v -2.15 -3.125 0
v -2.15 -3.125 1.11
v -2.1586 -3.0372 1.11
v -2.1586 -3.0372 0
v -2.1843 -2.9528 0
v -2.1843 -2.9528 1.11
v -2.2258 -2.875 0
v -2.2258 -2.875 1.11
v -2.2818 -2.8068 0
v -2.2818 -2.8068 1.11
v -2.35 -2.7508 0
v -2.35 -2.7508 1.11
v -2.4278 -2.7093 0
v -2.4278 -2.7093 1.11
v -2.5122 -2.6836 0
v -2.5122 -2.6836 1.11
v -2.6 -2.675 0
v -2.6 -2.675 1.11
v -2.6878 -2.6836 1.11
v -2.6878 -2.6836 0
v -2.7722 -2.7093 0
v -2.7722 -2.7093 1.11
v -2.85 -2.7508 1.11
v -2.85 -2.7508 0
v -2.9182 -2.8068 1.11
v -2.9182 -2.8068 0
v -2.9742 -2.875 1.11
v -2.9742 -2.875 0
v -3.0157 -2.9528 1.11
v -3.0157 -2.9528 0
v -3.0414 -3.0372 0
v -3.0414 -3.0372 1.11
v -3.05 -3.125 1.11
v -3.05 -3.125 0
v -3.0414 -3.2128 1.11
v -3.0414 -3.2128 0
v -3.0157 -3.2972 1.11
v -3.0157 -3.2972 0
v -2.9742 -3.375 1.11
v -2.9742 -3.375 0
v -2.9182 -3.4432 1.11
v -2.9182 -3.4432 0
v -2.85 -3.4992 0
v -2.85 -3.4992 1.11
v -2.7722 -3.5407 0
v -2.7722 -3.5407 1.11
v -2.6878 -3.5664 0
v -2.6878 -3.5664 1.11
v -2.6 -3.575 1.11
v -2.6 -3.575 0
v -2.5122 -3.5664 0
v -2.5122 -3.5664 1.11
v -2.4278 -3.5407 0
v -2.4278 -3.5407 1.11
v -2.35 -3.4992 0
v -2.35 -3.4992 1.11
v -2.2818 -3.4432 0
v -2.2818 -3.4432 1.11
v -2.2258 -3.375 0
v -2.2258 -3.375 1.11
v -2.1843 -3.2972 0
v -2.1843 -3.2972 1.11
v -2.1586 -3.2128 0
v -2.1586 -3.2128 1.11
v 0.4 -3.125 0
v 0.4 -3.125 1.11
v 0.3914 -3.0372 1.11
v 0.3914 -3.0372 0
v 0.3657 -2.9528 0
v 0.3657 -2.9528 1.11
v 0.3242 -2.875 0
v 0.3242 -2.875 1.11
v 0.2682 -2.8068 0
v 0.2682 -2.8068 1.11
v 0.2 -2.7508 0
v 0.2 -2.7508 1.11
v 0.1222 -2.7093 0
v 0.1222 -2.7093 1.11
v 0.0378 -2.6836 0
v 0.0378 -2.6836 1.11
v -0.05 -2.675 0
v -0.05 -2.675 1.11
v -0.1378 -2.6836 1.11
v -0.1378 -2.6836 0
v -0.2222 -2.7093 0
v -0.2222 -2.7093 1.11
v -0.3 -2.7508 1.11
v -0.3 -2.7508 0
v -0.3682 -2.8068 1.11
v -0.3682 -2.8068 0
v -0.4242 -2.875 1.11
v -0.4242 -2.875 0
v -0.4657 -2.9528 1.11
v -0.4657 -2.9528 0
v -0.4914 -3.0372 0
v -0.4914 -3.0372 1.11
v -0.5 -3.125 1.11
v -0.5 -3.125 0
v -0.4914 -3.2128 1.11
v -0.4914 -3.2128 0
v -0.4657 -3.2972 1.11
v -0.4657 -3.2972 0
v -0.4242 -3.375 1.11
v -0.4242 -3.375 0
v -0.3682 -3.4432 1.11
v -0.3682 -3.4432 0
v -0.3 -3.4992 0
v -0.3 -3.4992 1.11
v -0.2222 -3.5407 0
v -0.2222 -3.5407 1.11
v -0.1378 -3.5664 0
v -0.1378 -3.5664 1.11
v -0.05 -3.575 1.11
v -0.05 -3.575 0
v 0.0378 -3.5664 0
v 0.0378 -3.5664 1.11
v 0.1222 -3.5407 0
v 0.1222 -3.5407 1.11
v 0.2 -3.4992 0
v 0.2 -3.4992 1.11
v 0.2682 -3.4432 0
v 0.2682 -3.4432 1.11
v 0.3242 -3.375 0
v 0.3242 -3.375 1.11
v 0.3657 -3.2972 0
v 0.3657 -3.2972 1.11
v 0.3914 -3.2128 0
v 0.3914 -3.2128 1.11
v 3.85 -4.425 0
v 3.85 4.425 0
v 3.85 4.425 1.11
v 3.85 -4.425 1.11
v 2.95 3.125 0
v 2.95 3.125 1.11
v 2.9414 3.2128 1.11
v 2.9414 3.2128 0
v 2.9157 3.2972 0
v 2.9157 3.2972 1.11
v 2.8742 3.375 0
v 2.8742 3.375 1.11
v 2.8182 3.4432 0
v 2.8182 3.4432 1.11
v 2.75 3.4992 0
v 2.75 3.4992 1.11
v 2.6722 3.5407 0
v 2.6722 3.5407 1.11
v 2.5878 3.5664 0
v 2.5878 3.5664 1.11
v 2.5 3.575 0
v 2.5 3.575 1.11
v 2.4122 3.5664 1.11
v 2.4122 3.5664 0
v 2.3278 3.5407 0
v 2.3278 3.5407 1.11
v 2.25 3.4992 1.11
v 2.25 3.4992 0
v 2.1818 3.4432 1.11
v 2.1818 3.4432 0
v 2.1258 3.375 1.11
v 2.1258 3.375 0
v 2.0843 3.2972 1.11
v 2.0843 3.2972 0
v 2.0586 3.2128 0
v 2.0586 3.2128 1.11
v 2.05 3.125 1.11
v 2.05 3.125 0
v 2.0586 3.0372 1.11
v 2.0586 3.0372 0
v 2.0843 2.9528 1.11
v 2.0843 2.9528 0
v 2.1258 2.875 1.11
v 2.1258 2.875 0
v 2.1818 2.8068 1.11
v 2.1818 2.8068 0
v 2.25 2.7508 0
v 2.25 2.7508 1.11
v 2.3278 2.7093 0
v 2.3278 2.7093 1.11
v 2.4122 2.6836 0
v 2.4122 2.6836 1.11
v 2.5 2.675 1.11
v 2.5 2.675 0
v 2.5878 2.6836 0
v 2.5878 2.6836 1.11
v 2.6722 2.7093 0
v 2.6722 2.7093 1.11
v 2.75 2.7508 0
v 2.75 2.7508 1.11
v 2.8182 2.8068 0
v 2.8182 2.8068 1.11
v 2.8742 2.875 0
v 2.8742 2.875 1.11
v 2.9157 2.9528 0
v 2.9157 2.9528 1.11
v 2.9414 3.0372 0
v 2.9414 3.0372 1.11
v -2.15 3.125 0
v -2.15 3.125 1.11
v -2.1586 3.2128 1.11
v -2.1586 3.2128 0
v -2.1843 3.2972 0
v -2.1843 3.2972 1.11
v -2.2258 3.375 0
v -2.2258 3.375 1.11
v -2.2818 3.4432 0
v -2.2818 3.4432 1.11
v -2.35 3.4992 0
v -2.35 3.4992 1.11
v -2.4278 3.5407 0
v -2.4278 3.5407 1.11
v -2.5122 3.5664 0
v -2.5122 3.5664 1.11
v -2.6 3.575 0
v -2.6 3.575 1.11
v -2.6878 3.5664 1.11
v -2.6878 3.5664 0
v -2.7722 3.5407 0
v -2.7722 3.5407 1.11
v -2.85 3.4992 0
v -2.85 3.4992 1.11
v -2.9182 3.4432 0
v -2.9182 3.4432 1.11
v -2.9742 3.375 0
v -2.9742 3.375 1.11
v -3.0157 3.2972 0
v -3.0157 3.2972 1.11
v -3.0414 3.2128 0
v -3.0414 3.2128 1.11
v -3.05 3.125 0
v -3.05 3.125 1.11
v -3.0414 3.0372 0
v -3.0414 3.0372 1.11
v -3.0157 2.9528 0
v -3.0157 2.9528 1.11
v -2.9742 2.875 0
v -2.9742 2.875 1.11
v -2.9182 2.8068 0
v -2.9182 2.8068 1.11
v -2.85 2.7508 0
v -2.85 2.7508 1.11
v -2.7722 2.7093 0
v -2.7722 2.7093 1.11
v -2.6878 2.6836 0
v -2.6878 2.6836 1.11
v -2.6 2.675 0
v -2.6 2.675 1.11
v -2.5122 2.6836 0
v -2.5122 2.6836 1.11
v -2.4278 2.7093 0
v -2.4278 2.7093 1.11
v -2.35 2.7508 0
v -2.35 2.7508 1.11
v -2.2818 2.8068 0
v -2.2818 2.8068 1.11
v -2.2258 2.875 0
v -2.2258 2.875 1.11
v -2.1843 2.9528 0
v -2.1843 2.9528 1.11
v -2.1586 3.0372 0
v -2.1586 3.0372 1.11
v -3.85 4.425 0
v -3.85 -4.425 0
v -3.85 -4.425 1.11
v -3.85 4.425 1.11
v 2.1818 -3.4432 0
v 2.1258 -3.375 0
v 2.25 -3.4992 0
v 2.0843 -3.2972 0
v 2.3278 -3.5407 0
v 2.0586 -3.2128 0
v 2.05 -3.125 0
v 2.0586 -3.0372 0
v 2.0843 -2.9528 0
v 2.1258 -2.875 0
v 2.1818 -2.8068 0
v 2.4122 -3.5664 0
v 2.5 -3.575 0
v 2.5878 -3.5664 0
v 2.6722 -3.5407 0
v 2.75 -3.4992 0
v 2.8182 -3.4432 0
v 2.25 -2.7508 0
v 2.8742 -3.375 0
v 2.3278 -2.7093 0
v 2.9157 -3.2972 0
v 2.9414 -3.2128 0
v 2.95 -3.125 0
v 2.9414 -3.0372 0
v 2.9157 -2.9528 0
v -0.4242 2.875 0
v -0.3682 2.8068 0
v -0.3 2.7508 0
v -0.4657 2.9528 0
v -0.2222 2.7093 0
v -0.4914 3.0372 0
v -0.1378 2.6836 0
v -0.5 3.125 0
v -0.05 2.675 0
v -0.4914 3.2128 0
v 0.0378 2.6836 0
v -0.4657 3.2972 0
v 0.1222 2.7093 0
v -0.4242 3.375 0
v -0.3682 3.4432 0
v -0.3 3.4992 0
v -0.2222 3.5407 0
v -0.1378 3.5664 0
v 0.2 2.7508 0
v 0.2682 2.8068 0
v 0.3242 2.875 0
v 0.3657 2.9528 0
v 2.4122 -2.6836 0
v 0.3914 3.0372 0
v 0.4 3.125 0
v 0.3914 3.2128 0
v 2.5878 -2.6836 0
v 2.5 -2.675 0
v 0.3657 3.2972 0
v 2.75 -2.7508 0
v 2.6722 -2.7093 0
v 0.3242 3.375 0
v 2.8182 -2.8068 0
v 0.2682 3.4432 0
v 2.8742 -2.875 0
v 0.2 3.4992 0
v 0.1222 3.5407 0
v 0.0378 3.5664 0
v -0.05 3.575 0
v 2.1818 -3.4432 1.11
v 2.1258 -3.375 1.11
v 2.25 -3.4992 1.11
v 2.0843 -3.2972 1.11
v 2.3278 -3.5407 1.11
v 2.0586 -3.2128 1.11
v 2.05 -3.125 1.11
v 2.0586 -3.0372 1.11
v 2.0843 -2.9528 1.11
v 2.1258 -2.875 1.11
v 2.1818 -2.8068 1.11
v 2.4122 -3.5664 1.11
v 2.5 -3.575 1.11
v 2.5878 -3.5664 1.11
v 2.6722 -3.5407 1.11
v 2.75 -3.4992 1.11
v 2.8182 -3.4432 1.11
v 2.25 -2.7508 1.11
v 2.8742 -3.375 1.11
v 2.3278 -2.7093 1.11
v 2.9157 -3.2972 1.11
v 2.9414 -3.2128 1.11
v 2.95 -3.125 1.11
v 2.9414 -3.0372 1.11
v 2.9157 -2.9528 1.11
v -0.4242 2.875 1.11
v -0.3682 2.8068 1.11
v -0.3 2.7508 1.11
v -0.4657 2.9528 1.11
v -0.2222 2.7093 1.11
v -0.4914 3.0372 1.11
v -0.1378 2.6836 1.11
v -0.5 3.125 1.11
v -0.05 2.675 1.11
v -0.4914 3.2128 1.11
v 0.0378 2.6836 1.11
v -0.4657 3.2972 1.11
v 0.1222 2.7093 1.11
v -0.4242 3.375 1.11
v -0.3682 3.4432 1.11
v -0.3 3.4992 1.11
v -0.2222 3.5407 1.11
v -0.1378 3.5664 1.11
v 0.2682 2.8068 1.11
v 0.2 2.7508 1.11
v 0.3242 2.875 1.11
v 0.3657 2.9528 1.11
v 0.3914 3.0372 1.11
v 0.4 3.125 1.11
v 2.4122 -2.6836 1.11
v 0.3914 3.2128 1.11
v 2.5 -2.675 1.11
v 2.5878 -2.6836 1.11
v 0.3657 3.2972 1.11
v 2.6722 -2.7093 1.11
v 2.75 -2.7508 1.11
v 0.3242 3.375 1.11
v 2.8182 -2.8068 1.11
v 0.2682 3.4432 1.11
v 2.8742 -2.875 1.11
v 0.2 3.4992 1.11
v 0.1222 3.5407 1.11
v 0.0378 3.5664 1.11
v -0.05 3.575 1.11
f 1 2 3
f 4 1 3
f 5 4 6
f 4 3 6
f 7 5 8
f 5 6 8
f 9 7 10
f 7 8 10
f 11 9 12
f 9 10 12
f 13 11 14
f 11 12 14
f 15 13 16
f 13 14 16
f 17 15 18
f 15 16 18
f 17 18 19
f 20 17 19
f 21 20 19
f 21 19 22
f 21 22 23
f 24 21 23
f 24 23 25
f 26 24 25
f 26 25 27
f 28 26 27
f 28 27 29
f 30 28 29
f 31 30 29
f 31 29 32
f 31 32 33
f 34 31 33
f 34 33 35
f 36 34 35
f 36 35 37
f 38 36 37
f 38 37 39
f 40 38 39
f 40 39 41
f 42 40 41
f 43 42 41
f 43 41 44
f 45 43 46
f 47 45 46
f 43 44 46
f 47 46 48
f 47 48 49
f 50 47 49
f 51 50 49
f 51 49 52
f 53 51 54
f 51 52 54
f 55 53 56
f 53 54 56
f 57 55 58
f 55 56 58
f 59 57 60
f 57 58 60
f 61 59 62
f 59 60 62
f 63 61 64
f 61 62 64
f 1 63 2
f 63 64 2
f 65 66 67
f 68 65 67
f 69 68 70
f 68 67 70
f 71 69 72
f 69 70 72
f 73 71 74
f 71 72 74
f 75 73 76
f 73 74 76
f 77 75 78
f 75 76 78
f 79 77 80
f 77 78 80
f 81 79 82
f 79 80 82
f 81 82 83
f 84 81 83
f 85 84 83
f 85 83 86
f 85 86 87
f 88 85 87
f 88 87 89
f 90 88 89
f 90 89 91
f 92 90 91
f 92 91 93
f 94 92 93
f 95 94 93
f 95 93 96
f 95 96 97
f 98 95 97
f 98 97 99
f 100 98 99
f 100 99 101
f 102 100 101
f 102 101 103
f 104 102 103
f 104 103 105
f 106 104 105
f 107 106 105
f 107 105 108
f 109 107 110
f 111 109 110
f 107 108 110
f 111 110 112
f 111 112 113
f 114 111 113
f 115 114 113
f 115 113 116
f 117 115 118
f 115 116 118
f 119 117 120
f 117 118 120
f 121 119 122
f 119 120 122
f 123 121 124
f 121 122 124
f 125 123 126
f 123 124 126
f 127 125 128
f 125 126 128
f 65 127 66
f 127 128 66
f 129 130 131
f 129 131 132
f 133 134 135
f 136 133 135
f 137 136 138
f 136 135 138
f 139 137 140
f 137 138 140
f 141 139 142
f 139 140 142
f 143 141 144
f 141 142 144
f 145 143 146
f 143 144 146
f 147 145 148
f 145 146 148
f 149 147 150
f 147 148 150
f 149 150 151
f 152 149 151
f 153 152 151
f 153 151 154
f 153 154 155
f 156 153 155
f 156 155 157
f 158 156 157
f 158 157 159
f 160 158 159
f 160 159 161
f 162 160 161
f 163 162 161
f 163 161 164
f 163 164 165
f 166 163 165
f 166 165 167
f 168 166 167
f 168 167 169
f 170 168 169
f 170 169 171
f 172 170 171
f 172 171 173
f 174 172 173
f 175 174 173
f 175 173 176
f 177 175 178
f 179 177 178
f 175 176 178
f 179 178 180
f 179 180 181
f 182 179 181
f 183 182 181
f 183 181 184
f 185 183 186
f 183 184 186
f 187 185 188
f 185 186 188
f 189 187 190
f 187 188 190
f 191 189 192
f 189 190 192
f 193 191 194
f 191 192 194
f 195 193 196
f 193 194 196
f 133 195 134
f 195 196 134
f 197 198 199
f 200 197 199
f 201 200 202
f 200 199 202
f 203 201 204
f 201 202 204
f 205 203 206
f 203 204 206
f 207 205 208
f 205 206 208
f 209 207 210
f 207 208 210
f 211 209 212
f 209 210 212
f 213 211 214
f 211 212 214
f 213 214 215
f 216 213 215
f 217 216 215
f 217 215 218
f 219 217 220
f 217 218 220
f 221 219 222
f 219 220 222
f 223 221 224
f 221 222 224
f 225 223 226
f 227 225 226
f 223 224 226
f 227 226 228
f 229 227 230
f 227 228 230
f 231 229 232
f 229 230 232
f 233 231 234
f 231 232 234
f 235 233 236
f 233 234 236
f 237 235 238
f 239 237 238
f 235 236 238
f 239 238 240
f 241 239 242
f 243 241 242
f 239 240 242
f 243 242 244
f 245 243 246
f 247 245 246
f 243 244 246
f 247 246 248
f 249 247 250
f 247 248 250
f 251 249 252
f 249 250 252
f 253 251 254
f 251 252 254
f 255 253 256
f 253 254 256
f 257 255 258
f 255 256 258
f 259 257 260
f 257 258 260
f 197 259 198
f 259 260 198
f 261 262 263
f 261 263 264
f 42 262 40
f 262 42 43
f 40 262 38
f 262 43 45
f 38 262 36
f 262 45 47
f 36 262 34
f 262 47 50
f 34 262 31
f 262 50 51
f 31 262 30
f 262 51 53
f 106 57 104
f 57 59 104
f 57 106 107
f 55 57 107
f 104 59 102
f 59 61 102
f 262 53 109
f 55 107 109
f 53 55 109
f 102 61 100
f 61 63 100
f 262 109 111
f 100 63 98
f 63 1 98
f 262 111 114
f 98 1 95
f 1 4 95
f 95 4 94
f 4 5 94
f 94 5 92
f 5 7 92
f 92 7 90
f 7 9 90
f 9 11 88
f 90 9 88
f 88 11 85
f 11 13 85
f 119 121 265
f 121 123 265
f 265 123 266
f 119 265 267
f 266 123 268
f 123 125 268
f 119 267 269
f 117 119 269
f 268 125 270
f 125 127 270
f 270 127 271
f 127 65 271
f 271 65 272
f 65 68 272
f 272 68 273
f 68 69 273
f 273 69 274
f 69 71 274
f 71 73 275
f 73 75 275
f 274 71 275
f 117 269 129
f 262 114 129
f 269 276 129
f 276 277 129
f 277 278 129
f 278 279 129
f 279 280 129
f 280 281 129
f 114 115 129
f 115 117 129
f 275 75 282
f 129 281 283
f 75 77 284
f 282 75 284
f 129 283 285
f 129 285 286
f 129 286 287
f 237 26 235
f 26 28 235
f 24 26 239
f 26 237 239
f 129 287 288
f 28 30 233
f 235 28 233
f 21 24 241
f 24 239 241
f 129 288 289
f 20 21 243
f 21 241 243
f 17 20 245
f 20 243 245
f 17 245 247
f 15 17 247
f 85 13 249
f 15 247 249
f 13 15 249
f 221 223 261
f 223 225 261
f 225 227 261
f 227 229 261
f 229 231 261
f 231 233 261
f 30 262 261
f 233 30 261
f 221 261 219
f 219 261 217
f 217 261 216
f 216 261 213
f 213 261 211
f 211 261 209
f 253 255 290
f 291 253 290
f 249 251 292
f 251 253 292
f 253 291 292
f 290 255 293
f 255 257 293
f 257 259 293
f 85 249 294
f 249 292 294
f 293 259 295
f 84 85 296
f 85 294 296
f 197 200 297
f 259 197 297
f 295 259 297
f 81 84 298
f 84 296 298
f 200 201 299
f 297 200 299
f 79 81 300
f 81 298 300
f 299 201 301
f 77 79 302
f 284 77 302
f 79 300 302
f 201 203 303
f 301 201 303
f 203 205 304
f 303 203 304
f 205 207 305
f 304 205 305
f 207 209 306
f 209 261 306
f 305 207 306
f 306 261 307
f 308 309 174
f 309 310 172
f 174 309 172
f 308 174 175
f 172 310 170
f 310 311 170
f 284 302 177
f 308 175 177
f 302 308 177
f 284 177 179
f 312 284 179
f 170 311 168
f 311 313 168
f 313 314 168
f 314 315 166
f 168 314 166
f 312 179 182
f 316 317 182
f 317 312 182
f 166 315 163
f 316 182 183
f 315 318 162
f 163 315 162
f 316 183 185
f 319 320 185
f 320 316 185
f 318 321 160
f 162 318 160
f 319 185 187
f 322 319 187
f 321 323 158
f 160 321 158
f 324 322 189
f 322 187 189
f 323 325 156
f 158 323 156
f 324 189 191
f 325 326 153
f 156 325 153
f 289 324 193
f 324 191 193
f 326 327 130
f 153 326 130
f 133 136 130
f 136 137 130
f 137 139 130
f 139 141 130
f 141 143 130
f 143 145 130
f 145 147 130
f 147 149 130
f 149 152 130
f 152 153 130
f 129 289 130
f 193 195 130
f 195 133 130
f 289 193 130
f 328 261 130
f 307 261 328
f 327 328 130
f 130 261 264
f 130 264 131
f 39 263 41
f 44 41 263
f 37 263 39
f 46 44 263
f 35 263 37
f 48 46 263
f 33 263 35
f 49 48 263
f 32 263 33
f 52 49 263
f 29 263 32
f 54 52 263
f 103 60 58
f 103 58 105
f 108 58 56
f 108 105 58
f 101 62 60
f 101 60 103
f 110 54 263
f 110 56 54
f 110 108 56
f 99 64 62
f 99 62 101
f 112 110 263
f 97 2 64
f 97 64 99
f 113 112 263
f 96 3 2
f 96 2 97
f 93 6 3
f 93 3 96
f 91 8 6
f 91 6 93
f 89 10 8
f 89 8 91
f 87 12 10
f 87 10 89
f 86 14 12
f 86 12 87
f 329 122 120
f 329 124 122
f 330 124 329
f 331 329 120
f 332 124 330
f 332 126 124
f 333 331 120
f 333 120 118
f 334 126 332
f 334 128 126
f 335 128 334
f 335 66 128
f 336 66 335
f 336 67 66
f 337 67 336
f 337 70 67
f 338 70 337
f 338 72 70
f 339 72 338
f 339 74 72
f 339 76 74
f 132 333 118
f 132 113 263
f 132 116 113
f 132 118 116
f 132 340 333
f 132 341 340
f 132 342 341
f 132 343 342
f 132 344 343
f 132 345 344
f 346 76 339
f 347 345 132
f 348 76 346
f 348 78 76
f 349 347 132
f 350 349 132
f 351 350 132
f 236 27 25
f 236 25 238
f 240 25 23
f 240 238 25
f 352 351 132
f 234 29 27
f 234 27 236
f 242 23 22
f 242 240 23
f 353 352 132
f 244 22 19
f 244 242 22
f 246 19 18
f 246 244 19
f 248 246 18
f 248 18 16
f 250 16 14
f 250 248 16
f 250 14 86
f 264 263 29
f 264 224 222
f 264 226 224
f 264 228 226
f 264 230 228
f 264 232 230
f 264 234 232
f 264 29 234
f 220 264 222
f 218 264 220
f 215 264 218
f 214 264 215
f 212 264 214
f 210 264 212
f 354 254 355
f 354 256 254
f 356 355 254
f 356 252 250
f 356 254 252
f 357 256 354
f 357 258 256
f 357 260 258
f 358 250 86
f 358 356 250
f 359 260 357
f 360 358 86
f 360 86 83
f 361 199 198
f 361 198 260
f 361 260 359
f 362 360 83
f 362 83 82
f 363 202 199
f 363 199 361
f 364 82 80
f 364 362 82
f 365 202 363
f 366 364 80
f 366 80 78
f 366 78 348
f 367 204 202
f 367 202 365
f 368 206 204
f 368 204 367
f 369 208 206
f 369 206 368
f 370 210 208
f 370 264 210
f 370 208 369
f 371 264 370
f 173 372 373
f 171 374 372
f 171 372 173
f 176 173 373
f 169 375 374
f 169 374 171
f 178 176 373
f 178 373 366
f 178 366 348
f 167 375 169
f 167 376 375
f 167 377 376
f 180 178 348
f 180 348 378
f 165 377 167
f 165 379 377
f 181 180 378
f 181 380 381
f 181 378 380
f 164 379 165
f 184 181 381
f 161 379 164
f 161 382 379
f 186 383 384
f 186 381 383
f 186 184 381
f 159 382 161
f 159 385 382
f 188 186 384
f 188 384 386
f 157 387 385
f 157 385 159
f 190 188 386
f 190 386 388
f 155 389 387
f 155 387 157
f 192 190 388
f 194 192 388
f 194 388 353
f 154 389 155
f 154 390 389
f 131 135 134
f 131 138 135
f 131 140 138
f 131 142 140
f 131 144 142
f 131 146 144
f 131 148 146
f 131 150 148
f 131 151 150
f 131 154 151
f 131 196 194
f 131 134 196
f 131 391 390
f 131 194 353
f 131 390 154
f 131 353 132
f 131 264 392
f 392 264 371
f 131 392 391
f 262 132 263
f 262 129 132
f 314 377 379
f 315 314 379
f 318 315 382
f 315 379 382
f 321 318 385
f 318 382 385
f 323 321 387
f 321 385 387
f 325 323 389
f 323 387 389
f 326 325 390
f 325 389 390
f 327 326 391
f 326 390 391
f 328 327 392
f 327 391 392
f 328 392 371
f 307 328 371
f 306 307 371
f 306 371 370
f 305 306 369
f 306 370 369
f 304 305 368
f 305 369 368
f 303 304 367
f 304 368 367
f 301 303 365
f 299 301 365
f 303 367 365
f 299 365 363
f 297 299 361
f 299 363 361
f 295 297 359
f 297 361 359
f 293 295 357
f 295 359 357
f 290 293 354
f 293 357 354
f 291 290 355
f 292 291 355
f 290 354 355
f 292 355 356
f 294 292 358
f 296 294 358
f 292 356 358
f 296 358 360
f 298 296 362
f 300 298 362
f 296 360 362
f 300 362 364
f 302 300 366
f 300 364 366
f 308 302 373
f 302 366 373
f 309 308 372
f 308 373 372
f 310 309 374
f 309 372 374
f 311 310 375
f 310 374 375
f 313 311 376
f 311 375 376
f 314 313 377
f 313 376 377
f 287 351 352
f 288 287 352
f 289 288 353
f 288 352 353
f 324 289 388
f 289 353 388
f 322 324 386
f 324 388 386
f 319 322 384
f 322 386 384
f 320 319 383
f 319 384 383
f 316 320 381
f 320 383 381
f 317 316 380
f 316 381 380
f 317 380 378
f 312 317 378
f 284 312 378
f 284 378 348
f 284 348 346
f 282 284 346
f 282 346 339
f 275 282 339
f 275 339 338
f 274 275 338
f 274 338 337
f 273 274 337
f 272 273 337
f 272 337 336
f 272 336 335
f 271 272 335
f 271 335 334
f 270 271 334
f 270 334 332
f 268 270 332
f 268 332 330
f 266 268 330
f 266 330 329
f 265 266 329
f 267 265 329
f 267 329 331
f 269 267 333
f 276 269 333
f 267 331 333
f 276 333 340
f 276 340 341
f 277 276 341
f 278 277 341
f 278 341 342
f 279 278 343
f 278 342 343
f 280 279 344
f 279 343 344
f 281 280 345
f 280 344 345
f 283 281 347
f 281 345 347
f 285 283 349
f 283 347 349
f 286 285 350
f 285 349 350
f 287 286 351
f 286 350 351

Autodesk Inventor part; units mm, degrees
ref_plane "YZ Plane" through (0, 0, 0) normal (1, 0, 0) x (0, 1, 0)
ref_plane "XZ Plane" through (0, 0, 0) normal (0, 1, 0) x (-1, 0, 0)
ref_plane "XY Plane" through (0, 0, 0) normal (0, 0, 1) x (1, 0, 0)
sketch "Skizze1" plane through (0, 0, 0) normal (0, 0, 1) x (1, 0, 0)
  line L0 (-3.85, 4.425) -> (3.85, 4.425)
  line L1 (3.85, 4.425) -> (3.85, -4.425)
  line L2 (3.85, -4.425) -> (-3.85, -4.425)
  line L3 (-3.85, -4.425) -> (-3.85, 4.425)
  line L4 (-3.85, 4.425) -> (3.85, -4.425) construction
  point P0 (0, 0)
  point P1 (0, 0)
  dimension "d0" = 7.7
  dimension "d1" = 8.85
extrude "Extrusion2" add sketch "Skizze1" along normal blind 1.11
sketch "Skizze2" plane through (0, 0, 1.11) normal (0, 0, 1) x (1, 0, 0)
  line L0 (3.85, 4.425) -> (-3.85, 4.425) construction
  line L1 (-3.85, 4.425) -> (-3.85, 3.125) construction
  line L2 (-3.85, 4.425) -> (-3.85, -4.425) construction
  line L3 (-3.85, 3.125) -> (3.85, 3.125) construction
  line L4 (3.85, -4.425) -> (3.85, 4.425) construction
  line L5 (-3.85, 3.125) -> (-3.05, 3.125) construction
  line L6 (3.85, 3.125) -> (3.05, 3.125) construction
  line L7 (-3.05, 3.125) -> (-2.6, 3.125) construction
  circle A0 centre (-2.6, 3.125) radius 0.45
  circle A1 centre (-0.05, 3.125) radius 0.45
  circle A2 centre (2.5, 3.125) radius 0.45
  circle A3 centre (5.05, 3.125) radius 0.45
  circle A4 centre (7.6, 3.125) radius 0.45
  circle A5 centre (10.15, 3.125) radius 0.45
  line L8 (-3.85, -4.425) -> (-3.85, -3.125) construction
  line L9 (-3.85, -3.125) -> (3.85, -3.125) construction
  line L10 (-3.85, -3.125) -> (-2.6, -3.125) construction
  circle A6 centre (-2.6, -3.125) radius 0.45
  circle A7 centre (-0.05, -3.125) radius 0.45
  line L11 (-1.3, -3.125) -> (6.4, -3.125) construction
  circle A8 centre (2.5, -3.125) radius 0.45
  line L12 (1.25, -3.125) -> (8.95, -3.125) construction
  circle A9 centre (5.05, -3.125) radius 0.45
  line L13 (3.8, -3.125) -> (11.5, -3.125) construction
  circle A10 centre (7.6, -3.125) radius 0.45
  line L14 (6.35, -3.125) -> (14.05, -3.125) construction
  circle A11 centre (10.15, -3.125) radius 0.45
  line L15 (8.9, -3.125) -> (16.6, -3.125) construction
  line L16 (3.05, 3.125) -> (2.6, 3.125)
  point P0 (0, 0)
  dimension "d6" = 1.3
  dimension "d7" = 0.8
  dimension "d8" = 0.8
  dimension "d9" = 0.45
  dimension "d10" = 0.9
  dimension "d13" = 2.55
  dimension "d20" = 1.3
  dimension "d21" = 1.25
  dimension "d22" = 0.9
  dimension "d25" = 2.55
  dimension "d30" = 0.45
extrude "Extrusion3" cut sketch "Skizze2" against normal blind 1.11 contours A0 | A1 | A2 | A3 | A4 | A5 | A6 | A7 | A8 | A10 | A11
sketch "Skizze3" plane through (0, 0, 1.11) normal (0, 0, 1) x (1, 0, 0)
  line L0 (3.8509, -4.4242) -> (-3.85, -4.425) construction
  line L1 (-3.85, -4.425) -> (-3.8509, 4.4242) construction
  line L2 (-3.8509, 4.4242) -> (3.85, 4.425) construction
  line L3 (3.85, 4.425) -> (3.8509, -4.4242) construction
  point P0 (0, 0)
  point P1 (3.85, 4.425)
  point P2 (-3.85, -4.425)
decal "Aufkleber1"
properties part number "chip_gross"
